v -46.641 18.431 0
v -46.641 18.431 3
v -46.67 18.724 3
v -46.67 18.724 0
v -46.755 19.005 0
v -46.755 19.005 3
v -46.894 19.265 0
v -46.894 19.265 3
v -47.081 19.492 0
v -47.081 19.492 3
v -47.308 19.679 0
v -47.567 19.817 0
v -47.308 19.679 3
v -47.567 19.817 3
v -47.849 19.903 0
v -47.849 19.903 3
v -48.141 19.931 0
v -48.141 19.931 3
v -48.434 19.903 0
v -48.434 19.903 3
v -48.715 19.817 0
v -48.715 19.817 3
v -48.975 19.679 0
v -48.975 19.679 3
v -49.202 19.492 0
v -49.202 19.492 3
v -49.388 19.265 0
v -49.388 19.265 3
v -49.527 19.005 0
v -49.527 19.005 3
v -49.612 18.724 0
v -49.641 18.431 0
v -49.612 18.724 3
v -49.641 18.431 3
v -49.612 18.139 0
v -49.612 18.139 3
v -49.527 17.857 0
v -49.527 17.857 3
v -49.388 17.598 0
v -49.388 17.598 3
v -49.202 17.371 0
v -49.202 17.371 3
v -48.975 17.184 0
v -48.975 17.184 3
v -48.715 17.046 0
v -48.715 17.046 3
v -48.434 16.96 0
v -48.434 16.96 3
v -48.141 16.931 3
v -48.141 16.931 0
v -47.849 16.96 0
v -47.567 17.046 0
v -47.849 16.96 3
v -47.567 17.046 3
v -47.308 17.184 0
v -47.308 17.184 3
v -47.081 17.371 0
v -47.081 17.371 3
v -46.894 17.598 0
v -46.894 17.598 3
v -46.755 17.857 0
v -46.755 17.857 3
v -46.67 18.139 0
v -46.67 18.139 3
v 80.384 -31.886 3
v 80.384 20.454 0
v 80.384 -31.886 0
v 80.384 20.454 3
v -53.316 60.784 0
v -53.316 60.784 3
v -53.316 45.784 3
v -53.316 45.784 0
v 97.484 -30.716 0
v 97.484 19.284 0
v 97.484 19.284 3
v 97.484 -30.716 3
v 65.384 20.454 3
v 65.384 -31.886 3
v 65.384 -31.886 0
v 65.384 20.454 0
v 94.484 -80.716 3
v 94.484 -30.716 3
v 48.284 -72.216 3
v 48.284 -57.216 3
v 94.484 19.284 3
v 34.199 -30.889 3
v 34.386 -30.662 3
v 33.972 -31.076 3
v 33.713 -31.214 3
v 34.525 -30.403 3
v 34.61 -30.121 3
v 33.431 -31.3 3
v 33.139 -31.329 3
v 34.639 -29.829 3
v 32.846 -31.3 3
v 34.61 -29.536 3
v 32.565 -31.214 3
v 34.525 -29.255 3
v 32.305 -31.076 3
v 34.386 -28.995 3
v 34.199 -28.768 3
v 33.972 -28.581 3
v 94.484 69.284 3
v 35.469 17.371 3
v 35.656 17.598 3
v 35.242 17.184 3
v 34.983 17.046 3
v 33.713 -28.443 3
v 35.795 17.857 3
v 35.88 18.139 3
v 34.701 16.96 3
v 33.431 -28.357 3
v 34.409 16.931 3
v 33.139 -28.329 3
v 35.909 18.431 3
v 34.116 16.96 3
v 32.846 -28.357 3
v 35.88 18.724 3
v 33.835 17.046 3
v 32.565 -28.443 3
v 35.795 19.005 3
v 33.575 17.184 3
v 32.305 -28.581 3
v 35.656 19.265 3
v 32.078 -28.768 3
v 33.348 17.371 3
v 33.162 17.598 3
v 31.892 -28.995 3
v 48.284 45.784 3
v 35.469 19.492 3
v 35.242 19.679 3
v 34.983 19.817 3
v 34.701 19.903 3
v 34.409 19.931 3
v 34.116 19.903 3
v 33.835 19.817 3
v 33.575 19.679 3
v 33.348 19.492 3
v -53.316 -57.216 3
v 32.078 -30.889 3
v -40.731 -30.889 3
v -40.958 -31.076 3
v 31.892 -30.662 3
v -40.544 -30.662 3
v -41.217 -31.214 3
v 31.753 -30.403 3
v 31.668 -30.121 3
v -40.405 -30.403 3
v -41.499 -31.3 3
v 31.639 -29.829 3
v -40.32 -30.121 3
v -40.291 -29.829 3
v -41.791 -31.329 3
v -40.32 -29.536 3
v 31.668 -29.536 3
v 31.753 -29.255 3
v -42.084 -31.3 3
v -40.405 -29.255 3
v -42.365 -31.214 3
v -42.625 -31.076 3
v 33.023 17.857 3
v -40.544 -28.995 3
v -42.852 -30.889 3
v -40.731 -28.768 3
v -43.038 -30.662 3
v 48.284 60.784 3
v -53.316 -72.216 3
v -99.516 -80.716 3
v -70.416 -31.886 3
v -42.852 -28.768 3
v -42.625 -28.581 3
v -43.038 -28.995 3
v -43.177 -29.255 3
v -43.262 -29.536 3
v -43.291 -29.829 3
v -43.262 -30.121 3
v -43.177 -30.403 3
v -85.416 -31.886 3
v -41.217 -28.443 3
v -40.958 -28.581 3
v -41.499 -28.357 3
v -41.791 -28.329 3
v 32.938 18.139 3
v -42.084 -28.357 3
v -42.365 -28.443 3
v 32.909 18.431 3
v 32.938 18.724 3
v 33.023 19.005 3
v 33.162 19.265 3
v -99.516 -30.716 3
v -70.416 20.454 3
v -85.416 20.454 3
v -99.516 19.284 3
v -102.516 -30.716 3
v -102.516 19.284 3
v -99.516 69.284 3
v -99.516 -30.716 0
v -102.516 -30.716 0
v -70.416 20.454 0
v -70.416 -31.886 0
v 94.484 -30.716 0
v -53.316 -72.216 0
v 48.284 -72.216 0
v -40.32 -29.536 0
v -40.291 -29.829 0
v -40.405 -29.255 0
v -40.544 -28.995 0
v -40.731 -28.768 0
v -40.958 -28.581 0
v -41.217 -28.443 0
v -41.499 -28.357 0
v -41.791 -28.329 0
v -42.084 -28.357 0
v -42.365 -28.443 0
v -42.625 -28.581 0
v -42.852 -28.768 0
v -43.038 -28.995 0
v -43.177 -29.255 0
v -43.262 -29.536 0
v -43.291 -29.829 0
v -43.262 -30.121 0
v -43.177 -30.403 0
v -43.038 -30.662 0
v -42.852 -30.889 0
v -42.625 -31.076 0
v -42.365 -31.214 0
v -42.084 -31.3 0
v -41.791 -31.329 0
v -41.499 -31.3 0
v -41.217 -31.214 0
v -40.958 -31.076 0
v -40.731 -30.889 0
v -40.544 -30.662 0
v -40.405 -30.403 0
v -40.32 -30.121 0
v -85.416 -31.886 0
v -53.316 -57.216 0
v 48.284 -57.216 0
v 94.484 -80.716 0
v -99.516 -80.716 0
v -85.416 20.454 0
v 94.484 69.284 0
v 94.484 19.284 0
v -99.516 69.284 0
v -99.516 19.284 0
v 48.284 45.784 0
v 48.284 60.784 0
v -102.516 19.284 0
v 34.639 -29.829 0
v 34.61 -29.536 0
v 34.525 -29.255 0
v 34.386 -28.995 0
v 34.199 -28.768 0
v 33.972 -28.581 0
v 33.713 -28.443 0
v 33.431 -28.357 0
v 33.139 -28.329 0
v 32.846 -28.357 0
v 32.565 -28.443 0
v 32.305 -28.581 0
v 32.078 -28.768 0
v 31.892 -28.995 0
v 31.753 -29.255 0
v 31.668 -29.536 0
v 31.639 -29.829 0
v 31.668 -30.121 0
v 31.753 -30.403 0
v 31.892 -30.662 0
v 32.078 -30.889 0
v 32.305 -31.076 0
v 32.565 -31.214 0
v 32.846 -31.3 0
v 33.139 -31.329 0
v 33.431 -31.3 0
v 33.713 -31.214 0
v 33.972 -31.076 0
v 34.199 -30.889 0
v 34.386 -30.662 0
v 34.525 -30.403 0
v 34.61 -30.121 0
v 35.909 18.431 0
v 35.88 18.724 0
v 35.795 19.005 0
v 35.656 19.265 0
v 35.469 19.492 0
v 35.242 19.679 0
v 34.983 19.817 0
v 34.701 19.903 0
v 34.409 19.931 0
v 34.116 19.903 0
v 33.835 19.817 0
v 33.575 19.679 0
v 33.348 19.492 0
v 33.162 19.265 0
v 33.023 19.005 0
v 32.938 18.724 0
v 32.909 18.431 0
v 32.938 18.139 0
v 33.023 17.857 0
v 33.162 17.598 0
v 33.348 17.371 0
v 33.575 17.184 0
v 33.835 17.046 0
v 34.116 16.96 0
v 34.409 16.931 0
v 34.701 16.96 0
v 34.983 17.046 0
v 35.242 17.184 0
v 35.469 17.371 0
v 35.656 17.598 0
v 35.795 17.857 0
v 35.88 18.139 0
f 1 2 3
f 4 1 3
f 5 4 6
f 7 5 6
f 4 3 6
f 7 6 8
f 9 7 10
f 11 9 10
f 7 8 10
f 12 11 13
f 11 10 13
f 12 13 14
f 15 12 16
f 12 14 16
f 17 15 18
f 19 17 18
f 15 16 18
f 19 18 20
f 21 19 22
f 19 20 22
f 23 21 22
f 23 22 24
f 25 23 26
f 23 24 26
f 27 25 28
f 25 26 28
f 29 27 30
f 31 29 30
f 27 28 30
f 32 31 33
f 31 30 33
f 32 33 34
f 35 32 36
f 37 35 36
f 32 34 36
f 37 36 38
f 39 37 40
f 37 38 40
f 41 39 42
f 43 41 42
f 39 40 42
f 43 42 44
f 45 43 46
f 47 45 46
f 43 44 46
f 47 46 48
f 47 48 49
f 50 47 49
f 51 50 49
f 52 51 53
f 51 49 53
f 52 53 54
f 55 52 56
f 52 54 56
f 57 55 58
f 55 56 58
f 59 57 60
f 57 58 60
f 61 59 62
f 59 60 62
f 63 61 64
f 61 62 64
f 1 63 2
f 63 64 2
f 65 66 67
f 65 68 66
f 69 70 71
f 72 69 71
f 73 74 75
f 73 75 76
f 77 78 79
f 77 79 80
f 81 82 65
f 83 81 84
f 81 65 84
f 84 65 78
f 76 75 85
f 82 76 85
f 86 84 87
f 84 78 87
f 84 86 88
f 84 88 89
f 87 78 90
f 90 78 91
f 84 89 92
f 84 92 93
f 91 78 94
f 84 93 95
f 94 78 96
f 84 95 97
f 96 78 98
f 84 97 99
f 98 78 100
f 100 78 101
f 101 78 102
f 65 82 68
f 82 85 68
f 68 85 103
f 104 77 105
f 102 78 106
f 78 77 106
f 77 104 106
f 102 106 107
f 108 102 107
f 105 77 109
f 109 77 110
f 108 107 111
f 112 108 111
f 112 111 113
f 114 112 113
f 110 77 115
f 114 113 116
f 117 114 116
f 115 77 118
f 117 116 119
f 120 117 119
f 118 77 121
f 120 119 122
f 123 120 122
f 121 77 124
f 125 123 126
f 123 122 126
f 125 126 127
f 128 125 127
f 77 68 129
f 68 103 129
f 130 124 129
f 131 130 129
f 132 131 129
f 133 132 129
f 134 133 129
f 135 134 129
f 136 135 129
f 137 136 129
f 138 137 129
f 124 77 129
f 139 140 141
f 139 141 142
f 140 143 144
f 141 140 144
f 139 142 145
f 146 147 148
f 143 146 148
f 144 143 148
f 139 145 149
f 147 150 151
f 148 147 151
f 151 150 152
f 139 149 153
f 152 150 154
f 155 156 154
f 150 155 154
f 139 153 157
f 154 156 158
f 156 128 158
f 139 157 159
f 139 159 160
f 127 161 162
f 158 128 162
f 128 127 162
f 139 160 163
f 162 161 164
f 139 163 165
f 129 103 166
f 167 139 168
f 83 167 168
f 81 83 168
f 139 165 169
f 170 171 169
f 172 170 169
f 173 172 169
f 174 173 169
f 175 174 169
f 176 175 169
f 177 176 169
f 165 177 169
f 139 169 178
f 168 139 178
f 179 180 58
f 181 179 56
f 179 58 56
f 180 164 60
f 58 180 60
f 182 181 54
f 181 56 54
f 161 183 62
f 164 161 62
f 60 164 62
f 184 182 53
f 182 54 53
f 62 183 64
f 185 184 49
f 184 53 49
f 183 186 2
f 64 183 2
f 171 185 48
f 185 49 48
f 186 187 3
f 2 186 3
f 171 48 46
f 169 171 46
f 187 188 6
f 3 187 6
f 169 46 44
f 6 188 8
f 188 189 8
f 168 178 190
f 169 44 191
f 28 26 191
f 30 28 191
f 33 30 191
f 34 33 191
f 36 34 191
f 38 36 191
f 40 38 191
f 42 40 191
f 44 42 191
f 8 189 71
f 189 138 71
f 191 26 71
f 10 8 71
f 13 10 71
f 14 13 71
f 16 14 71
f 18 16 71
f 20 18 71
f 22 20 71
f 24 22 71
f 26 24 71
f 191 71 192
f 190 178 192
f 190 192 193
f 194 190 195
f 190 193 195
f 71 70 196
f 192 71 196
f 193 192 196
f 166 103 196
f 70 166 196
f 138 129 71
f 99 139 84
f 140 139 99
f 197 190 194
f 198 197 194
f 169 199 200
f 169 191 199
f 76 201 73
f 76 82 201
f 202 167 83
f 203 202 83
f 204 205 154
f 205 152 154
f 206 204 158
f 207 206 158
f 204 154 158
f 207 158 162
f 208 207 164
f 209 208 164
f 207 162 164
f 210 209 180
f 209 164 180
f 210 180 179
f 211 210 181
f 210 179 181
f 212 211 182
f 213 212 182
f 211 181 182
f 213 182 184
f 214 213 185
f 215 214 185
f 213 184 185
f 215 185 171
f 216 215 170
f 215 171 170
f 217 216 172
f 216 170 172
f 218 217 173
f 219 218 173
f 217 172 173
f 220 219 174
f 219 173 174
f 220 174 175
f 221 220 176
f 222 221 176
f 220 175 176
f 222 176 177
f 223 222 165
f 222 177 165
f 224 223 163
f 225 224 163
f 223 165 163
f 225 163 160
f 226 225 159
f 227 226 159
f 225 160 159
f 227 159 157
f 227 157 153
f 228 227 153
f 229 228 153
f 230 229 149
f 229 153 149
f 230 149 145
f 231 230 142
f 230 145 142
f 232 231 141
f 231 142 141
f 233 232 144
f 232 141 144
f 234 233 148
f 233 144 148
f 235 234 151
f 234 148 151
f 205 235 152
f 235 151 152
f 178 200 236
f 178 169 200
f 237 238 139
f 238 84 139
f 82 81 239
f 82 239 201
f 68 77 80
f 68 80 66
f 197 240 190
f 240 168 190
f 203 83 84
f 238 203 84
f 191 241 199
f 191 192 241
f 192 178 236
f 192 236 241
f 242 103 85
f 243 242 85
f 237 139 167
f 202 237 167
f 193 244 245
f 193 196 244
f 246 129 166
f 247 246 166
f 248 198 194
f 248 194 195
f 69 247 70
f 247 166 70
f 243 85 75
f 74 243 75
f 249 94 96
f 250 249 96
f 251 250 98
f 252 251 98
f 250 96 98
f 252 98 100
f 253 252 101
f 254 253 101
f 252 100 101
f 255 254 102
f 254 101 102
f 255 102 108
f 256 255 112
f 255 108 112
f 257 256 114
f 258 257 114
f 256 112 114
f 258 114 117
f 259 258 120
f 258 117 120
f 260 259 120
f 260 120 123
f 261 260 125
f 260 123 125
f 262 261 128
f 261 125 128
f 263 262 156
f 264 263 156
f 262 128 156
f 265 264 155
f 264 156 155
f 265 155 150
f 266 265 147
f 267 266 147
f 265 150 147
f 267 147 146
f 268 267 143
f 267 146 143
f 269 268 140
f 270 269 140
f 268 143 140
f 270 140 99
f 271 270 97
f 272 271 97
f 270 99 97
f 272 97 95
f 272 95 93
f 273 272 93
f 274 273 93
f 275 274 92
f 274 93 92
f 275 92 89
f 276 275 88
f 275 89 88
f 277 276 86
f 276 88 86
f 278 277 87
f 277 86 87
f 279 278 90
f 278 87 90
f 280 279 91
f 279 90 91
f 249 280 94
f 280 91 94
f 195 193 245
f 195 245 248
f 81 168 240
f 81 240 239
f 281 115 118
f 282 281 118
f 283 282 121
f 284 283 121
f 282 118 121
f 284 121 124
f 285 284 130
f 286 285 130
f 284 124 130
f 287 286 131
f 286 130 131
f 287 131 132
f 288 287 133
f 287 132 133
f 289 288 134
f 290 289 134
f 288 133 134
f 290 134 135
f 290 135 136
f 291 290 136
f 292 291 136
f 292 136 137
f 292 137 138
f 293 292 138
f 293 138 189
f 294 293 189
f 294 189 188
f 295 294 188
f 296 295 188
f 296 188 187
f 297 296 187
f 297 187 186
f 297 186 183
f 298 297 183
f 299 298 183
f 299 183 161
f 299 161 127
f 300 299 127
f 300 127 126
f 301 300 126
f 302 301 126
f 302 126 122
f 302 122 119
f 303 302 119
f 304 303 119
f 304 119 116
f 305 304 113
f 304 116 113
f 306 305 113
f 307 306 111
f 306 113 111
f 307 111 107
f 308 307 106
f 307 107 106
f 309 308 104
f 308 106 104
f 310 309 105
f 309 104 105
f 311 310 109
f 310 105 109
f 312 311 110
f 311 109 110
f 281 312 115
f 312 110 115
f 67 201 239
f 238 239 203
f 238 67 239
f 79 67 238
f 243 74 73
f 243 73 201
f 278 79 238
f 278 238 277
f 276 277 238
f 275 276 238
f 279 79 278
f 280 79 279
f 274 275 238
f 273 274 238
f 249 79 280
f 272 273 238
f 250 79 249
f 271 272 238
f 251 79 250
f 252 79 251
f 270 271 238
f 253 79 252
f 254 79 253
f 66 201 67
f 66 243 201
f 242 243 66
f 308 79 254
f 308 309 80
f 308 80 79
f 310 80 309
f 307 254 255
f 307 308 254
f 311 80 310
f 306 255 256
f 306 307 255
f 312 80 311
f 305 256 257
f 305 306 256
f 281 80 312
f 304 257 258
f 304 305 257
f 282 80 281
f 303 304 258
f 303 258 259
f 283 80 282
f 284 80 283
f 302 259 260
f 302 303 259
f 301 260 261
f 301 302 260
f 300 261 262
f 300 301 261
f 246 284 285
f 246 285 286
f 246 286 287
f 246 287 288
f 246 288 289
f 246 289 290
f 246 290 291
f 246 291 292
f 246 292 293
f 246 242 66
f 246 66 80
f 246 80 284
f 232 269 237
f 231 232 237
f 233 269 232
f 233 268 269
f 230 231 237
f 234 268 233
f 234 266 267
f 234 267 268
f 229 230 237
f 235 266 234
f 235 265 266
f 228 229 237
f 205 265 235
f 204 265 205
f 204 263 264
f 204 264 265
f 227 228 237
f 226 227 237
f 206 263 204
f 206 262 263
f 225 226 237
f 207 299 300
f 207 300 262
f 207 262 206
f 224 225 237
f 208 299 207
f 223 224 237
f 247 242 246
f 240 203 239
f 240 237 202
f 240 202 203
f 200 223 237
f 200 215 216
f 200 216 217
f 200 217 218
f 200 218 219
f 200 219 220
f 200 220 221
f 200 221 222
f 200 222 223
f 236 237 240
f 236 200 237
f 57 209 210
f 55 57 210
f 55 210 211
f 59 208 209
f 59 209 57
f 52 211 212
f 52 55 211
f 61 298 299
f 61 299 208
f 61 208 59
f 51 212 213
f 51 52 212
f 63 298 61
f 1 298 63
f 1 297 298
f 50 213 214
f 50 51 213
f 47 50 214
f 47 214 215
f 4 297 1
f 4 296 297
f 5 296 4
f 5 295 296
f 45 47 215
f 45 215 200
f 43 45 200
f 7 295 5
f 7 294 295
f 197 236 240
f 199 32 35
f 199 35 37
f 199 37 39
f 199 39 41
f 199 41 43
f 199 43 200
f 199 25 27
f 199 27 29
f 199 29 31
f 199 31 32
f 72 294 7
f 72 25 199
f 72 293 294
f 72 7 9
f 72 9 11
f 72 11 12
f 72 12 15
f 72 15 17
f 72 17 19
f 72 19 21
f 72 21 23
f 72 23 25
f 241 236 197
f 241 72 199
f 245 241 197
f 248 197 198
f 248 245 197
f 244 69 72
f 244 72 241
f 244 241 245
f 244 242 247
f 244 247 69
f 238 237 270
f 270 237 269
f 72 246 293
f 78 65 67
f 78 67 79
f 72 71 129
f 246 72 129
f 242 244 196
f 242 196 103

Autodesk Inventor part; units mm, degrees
ref_plane "YZ Plane" through (0, 0, 0) normal (1, 0, 0) x (0, 1, 0)
ref_plane "XZ Plane" through (0, 0, 0) normal (0, 1, 0) x (-1, 0, 0)
ref_plane "XY Plane" through (0, 0, 0) normal (0, 0, 1) x (1, 0, 0)
sketch "Sketch1" plane through (0, 0, 0) normal (0, 0, 1) x (1, 0, 0)
  line L0 (-102.5157, 69.2842) -> (97.4843, 69.2842)
  line L1 (97.4843, 69.2842) -> (97.4843, -80.7158)
  line L2 (97.4843, -80.7158) -> (-102.5157, -80.7158)
  line L3 (-102.5157, -80.7158) -> (-102.5157, 69.2842)
  point P0 (0, 0)
extrude "Extrusion1" add sketch "Sketch1" along normal blind 3
sketch "Sketch3" plane through (0, 0, 3) normal (0, 0, 1) x (1, 0, 0)
  point P0 (0, 0)
sketch "Sketch4" plane through (0, 0, 3) normal (0, 0, 1) x (1, 0, 0)
  line L0 (97.4843, 69.2842) -> (-102.5157, 69.2842) projected
  line L1 (-102.5157, 69.2842) -> (-99.5157, 69.2842)
  line L2 (-99.5157, 69.2842) -> (-99.5157, 19.2842)
  line L3 (-99.5157, 19.2842) -> (-102.5157, 19.2842)
  line L4 (-102.5157, 19.2842) -> (-102.5157, 69.2842)
  point P0 (0, 0)
extrude "Extrusion2" cut sketch "Sketch4" against normal blind 3
sketch "Sketch5" plane through (0, 0, 3) normal (0, 0, 1) x (1, 0, 0)
  line L0 (97.4843, -80.7158) -> (94.4843, -80.7158)
  line L1 (94.4843, -80.7158) -> (94.4843, -30.7158)
  line L2 (94.4843, -30.7158) -> (97.4843, -30.7158)
  line L3 (97.4843, -30.7158) -> (97.4843, -80.7158)
  point P0 (0, 0)
  point P1 (-102.5157, -80.7158)
  dimension "d17" = 3
  dimension "d18" = 50
extrude "Extrusion3" cut sketch "Sketch5" against normal blind 3
sketch "Sketch6" plane through (0, 0, 3) normal (0, 0, 1) x (1, 0, 0)
  line L0 (97.4843, -30.7158) -> (97.4843, 69.2842) projected
  line L1 (97.4843, 69.2842) -> (94.4843, 69.2842)
  line L2 (94.4843, 69.2842) -> (94.4843, 19.2842)
  line L3 (94.4843, 19.2842) -> (97.4843, 19.2842)
  line L4 (97.4843, 19.2842) -> (97.4843, 69.2842)
  point P0 (0, 0)
  dimension "d21" = 50
  dimension "d22" = 3
extrude "Extrusion4" cut sketch "Sketch6" against normal blind 3
sketch "Sketch7" plane through (0, 0, 3) normal (0, 0, 1) x (1, 0, 0)
  line L0 (-102.5157, 19.2842) -> (-102.5157, -80.7158) projected
  line L1 (-102.5157, -80.7158) -> (-99.5157, -80.7158)
  line L2 (-99.5157, -80.7158) -> (-99.5157, -30.7158)
  line L3 (-99.5157, -30.7158) -> (-102.5157, -30.7158)
  line L4 (-102.5157, -30.7158) -> (-102.5157, -80.7158)
  point P0 (0, 0)
  dimension "d25" = 50
  dimension "d26" = 3
extrude "Extrusion5" cut sketch "Sketch7" against normal blind 3
sketch "Sketch8" plane through (0, 0, 3) normal (0, 0, 1) x (1, 0, 0)
  line L0 (-102.5157, -30.7158) -> (-102.5157, 19.2842) projected
  line L1 (97.4843, -30.7158) -> (94.4843, -30.7158) projected
  line L2 (94.4843, -80.7158) -> (-99.5157, -80.7158) projected
  line L3 (-10.0157, -50.7158) -> (4.9843, -50.7158)
  line L4 (4.9843, -50.7158) -> (4.9843, -80.7158)
  line L5 (4.9843, -80.7158) -> (-10.0157, -80.7158)
  line L6 (-10.0157, -80.7158) -> (-10.0157, -50.7158)
  point P0 (0, 0)
  dimension "d32" = 15
  dimension "d33" = 30
extrude "Extrusion6" cut sketch "Sketch8" against normal blind 3
sketch "Sketch9" plane through (-10.0157, -80.7158, 3) normal (1, 0, 0) x (0, 0, -1)
  point P0 (3, 80.7158)
sketch "Sketch10" plane through (-10.0157, -50.7158, 3) normal (0, -1, 0) x (1, 0, 0)
  line L0 (15, 0) -> (15, -3) projected
  line L1 (15, -3) -> (0, -3) projected
  line L2 (15, 0) -> (0, 0)
  line L3 (0, 0) -> (0, -3)
  line L4 (0, -3) -> (15, -3)
  line L5 (15, -3) -> (15, 0)
  point P0 (10.0157, -3)
extrude "Extrusion7" add sketch "Sketch10" along normal blind 30
sketch "Sketch11" plane through (0, 0, 3) normal (0, 0, 1) x (1, 0, 0)
  line L0 (94.4843, -80.7158) -> (-99.5157, -80.7158) projected
  line L1 (-99.5157, -80.7158) -> (-99.5157, -30.7158) projected
  line L2 (97.4843, 19.2842) -> (97.4843, -30.7158) projected
  line L3 (-102.5157, -30.7158) -> (-102.5157, 19.2842) projected
  line L4 (-99.5157, 69.2842) -> (94.4843, 69.2842) projected
  point P0 (0, 0)
sketch "Sketch12" plane through (0, 0, 3) normal (0, 0, 1) x (1, 0, 0)
  circle A0 centre (34.4088, 18.4314) radius 1.5
  circle A1 centre (33.1388, -29.8286) radius 1.5
  circle A2 centre (-41.7912, -29.8286) radius 1.5
  circle A3 centre (-48.1412, 18.4314) radius 1.5
  point P0 (0, 0)
extrude "Extrusion8" cut sketch "Sketch12" against normal blind 3
sketch "Sketch13" plane through (0, 0, 3) normal (0, 0, 1) x (1, 0, 0)
  line L0 (-99.5157, 69.2842) -> (94.4843, 69.2842) projected
  line L1 (-102.5157, -30.7158) -> (-102.5157, 19.2842) projected
  line L2 (94.4843, -80.7158) -> (-99.5157, -80.7158) projected
  line L3 (-85.4157, 20.4542) -> (-70.4157, 20.4542)
  line L4 (-70.4157, 20.4542) -> (-70.4157, -31.8858)
  line L5 (-70.4157, -31.8858) -> (-85.4157, -31.8858)
  line L6 (-85.4157, -31.8858) -> (-85.4157, 20.4542)
  line L7 (-53.3157, 45.7842) -> (48.2843, 45.7842)
  line L8 (48.2843, 45.7842) -> (48.2843, 60.7842)
  line L9 (48.2843, 60.7842) -> (-53.3157, 60.7842)
  line L10 (-53.3157, 60.7842) -> (-53.3157, 45.7842)
  line L11 (65.3843, 20.4542) -> (80.3843, 20.4542)
  line L12 (80.3843, 20.4542) -> (80.3843, -31.8858)
  line L13 (80.3843, -31.8858) -> (65.3843, -31.8858)
  line L14 (65.3843, -31.8858) -> (65.3843, 20.4542)
  line L15 (97.4843, -30.7158) -> (97.4843, 19.2842) projected
  line L16 (94.4843, 69.2842) -> (94.4843, 19.2842) projected
  line L17 (-99.5157, 19.2842) -> (-99.5157, 69.2842) projected
  line L18 (-53.3157, -72.2158) -> (48.2843, -72.2158)
  line L19 (48.2843, -72.2158) -> (48.2843, -57.2158)
  line L20 (48.2843, -57.2158) -> (-53.3157, -57.2158)
  line L21 (-53.3157, -57.2158) -> (-53.3157, -72.2158)
  line L22 (-99.5157, -30.7158) -> (-99.5157, -80.7158) projected
  line L23 (94.4843, -30.7158) -> (94.4843, -80.7158) projected
  point P0 (0, 0)
extrude "Extrusion9" cut sketch "Sketch13" against normal blind 3
sketch "Sketch14" plane through (0, 0, 3) normal (0, 0, 1) x (1, 0, 0)
  point P0 (0, 0)
properties part number "Level3"
